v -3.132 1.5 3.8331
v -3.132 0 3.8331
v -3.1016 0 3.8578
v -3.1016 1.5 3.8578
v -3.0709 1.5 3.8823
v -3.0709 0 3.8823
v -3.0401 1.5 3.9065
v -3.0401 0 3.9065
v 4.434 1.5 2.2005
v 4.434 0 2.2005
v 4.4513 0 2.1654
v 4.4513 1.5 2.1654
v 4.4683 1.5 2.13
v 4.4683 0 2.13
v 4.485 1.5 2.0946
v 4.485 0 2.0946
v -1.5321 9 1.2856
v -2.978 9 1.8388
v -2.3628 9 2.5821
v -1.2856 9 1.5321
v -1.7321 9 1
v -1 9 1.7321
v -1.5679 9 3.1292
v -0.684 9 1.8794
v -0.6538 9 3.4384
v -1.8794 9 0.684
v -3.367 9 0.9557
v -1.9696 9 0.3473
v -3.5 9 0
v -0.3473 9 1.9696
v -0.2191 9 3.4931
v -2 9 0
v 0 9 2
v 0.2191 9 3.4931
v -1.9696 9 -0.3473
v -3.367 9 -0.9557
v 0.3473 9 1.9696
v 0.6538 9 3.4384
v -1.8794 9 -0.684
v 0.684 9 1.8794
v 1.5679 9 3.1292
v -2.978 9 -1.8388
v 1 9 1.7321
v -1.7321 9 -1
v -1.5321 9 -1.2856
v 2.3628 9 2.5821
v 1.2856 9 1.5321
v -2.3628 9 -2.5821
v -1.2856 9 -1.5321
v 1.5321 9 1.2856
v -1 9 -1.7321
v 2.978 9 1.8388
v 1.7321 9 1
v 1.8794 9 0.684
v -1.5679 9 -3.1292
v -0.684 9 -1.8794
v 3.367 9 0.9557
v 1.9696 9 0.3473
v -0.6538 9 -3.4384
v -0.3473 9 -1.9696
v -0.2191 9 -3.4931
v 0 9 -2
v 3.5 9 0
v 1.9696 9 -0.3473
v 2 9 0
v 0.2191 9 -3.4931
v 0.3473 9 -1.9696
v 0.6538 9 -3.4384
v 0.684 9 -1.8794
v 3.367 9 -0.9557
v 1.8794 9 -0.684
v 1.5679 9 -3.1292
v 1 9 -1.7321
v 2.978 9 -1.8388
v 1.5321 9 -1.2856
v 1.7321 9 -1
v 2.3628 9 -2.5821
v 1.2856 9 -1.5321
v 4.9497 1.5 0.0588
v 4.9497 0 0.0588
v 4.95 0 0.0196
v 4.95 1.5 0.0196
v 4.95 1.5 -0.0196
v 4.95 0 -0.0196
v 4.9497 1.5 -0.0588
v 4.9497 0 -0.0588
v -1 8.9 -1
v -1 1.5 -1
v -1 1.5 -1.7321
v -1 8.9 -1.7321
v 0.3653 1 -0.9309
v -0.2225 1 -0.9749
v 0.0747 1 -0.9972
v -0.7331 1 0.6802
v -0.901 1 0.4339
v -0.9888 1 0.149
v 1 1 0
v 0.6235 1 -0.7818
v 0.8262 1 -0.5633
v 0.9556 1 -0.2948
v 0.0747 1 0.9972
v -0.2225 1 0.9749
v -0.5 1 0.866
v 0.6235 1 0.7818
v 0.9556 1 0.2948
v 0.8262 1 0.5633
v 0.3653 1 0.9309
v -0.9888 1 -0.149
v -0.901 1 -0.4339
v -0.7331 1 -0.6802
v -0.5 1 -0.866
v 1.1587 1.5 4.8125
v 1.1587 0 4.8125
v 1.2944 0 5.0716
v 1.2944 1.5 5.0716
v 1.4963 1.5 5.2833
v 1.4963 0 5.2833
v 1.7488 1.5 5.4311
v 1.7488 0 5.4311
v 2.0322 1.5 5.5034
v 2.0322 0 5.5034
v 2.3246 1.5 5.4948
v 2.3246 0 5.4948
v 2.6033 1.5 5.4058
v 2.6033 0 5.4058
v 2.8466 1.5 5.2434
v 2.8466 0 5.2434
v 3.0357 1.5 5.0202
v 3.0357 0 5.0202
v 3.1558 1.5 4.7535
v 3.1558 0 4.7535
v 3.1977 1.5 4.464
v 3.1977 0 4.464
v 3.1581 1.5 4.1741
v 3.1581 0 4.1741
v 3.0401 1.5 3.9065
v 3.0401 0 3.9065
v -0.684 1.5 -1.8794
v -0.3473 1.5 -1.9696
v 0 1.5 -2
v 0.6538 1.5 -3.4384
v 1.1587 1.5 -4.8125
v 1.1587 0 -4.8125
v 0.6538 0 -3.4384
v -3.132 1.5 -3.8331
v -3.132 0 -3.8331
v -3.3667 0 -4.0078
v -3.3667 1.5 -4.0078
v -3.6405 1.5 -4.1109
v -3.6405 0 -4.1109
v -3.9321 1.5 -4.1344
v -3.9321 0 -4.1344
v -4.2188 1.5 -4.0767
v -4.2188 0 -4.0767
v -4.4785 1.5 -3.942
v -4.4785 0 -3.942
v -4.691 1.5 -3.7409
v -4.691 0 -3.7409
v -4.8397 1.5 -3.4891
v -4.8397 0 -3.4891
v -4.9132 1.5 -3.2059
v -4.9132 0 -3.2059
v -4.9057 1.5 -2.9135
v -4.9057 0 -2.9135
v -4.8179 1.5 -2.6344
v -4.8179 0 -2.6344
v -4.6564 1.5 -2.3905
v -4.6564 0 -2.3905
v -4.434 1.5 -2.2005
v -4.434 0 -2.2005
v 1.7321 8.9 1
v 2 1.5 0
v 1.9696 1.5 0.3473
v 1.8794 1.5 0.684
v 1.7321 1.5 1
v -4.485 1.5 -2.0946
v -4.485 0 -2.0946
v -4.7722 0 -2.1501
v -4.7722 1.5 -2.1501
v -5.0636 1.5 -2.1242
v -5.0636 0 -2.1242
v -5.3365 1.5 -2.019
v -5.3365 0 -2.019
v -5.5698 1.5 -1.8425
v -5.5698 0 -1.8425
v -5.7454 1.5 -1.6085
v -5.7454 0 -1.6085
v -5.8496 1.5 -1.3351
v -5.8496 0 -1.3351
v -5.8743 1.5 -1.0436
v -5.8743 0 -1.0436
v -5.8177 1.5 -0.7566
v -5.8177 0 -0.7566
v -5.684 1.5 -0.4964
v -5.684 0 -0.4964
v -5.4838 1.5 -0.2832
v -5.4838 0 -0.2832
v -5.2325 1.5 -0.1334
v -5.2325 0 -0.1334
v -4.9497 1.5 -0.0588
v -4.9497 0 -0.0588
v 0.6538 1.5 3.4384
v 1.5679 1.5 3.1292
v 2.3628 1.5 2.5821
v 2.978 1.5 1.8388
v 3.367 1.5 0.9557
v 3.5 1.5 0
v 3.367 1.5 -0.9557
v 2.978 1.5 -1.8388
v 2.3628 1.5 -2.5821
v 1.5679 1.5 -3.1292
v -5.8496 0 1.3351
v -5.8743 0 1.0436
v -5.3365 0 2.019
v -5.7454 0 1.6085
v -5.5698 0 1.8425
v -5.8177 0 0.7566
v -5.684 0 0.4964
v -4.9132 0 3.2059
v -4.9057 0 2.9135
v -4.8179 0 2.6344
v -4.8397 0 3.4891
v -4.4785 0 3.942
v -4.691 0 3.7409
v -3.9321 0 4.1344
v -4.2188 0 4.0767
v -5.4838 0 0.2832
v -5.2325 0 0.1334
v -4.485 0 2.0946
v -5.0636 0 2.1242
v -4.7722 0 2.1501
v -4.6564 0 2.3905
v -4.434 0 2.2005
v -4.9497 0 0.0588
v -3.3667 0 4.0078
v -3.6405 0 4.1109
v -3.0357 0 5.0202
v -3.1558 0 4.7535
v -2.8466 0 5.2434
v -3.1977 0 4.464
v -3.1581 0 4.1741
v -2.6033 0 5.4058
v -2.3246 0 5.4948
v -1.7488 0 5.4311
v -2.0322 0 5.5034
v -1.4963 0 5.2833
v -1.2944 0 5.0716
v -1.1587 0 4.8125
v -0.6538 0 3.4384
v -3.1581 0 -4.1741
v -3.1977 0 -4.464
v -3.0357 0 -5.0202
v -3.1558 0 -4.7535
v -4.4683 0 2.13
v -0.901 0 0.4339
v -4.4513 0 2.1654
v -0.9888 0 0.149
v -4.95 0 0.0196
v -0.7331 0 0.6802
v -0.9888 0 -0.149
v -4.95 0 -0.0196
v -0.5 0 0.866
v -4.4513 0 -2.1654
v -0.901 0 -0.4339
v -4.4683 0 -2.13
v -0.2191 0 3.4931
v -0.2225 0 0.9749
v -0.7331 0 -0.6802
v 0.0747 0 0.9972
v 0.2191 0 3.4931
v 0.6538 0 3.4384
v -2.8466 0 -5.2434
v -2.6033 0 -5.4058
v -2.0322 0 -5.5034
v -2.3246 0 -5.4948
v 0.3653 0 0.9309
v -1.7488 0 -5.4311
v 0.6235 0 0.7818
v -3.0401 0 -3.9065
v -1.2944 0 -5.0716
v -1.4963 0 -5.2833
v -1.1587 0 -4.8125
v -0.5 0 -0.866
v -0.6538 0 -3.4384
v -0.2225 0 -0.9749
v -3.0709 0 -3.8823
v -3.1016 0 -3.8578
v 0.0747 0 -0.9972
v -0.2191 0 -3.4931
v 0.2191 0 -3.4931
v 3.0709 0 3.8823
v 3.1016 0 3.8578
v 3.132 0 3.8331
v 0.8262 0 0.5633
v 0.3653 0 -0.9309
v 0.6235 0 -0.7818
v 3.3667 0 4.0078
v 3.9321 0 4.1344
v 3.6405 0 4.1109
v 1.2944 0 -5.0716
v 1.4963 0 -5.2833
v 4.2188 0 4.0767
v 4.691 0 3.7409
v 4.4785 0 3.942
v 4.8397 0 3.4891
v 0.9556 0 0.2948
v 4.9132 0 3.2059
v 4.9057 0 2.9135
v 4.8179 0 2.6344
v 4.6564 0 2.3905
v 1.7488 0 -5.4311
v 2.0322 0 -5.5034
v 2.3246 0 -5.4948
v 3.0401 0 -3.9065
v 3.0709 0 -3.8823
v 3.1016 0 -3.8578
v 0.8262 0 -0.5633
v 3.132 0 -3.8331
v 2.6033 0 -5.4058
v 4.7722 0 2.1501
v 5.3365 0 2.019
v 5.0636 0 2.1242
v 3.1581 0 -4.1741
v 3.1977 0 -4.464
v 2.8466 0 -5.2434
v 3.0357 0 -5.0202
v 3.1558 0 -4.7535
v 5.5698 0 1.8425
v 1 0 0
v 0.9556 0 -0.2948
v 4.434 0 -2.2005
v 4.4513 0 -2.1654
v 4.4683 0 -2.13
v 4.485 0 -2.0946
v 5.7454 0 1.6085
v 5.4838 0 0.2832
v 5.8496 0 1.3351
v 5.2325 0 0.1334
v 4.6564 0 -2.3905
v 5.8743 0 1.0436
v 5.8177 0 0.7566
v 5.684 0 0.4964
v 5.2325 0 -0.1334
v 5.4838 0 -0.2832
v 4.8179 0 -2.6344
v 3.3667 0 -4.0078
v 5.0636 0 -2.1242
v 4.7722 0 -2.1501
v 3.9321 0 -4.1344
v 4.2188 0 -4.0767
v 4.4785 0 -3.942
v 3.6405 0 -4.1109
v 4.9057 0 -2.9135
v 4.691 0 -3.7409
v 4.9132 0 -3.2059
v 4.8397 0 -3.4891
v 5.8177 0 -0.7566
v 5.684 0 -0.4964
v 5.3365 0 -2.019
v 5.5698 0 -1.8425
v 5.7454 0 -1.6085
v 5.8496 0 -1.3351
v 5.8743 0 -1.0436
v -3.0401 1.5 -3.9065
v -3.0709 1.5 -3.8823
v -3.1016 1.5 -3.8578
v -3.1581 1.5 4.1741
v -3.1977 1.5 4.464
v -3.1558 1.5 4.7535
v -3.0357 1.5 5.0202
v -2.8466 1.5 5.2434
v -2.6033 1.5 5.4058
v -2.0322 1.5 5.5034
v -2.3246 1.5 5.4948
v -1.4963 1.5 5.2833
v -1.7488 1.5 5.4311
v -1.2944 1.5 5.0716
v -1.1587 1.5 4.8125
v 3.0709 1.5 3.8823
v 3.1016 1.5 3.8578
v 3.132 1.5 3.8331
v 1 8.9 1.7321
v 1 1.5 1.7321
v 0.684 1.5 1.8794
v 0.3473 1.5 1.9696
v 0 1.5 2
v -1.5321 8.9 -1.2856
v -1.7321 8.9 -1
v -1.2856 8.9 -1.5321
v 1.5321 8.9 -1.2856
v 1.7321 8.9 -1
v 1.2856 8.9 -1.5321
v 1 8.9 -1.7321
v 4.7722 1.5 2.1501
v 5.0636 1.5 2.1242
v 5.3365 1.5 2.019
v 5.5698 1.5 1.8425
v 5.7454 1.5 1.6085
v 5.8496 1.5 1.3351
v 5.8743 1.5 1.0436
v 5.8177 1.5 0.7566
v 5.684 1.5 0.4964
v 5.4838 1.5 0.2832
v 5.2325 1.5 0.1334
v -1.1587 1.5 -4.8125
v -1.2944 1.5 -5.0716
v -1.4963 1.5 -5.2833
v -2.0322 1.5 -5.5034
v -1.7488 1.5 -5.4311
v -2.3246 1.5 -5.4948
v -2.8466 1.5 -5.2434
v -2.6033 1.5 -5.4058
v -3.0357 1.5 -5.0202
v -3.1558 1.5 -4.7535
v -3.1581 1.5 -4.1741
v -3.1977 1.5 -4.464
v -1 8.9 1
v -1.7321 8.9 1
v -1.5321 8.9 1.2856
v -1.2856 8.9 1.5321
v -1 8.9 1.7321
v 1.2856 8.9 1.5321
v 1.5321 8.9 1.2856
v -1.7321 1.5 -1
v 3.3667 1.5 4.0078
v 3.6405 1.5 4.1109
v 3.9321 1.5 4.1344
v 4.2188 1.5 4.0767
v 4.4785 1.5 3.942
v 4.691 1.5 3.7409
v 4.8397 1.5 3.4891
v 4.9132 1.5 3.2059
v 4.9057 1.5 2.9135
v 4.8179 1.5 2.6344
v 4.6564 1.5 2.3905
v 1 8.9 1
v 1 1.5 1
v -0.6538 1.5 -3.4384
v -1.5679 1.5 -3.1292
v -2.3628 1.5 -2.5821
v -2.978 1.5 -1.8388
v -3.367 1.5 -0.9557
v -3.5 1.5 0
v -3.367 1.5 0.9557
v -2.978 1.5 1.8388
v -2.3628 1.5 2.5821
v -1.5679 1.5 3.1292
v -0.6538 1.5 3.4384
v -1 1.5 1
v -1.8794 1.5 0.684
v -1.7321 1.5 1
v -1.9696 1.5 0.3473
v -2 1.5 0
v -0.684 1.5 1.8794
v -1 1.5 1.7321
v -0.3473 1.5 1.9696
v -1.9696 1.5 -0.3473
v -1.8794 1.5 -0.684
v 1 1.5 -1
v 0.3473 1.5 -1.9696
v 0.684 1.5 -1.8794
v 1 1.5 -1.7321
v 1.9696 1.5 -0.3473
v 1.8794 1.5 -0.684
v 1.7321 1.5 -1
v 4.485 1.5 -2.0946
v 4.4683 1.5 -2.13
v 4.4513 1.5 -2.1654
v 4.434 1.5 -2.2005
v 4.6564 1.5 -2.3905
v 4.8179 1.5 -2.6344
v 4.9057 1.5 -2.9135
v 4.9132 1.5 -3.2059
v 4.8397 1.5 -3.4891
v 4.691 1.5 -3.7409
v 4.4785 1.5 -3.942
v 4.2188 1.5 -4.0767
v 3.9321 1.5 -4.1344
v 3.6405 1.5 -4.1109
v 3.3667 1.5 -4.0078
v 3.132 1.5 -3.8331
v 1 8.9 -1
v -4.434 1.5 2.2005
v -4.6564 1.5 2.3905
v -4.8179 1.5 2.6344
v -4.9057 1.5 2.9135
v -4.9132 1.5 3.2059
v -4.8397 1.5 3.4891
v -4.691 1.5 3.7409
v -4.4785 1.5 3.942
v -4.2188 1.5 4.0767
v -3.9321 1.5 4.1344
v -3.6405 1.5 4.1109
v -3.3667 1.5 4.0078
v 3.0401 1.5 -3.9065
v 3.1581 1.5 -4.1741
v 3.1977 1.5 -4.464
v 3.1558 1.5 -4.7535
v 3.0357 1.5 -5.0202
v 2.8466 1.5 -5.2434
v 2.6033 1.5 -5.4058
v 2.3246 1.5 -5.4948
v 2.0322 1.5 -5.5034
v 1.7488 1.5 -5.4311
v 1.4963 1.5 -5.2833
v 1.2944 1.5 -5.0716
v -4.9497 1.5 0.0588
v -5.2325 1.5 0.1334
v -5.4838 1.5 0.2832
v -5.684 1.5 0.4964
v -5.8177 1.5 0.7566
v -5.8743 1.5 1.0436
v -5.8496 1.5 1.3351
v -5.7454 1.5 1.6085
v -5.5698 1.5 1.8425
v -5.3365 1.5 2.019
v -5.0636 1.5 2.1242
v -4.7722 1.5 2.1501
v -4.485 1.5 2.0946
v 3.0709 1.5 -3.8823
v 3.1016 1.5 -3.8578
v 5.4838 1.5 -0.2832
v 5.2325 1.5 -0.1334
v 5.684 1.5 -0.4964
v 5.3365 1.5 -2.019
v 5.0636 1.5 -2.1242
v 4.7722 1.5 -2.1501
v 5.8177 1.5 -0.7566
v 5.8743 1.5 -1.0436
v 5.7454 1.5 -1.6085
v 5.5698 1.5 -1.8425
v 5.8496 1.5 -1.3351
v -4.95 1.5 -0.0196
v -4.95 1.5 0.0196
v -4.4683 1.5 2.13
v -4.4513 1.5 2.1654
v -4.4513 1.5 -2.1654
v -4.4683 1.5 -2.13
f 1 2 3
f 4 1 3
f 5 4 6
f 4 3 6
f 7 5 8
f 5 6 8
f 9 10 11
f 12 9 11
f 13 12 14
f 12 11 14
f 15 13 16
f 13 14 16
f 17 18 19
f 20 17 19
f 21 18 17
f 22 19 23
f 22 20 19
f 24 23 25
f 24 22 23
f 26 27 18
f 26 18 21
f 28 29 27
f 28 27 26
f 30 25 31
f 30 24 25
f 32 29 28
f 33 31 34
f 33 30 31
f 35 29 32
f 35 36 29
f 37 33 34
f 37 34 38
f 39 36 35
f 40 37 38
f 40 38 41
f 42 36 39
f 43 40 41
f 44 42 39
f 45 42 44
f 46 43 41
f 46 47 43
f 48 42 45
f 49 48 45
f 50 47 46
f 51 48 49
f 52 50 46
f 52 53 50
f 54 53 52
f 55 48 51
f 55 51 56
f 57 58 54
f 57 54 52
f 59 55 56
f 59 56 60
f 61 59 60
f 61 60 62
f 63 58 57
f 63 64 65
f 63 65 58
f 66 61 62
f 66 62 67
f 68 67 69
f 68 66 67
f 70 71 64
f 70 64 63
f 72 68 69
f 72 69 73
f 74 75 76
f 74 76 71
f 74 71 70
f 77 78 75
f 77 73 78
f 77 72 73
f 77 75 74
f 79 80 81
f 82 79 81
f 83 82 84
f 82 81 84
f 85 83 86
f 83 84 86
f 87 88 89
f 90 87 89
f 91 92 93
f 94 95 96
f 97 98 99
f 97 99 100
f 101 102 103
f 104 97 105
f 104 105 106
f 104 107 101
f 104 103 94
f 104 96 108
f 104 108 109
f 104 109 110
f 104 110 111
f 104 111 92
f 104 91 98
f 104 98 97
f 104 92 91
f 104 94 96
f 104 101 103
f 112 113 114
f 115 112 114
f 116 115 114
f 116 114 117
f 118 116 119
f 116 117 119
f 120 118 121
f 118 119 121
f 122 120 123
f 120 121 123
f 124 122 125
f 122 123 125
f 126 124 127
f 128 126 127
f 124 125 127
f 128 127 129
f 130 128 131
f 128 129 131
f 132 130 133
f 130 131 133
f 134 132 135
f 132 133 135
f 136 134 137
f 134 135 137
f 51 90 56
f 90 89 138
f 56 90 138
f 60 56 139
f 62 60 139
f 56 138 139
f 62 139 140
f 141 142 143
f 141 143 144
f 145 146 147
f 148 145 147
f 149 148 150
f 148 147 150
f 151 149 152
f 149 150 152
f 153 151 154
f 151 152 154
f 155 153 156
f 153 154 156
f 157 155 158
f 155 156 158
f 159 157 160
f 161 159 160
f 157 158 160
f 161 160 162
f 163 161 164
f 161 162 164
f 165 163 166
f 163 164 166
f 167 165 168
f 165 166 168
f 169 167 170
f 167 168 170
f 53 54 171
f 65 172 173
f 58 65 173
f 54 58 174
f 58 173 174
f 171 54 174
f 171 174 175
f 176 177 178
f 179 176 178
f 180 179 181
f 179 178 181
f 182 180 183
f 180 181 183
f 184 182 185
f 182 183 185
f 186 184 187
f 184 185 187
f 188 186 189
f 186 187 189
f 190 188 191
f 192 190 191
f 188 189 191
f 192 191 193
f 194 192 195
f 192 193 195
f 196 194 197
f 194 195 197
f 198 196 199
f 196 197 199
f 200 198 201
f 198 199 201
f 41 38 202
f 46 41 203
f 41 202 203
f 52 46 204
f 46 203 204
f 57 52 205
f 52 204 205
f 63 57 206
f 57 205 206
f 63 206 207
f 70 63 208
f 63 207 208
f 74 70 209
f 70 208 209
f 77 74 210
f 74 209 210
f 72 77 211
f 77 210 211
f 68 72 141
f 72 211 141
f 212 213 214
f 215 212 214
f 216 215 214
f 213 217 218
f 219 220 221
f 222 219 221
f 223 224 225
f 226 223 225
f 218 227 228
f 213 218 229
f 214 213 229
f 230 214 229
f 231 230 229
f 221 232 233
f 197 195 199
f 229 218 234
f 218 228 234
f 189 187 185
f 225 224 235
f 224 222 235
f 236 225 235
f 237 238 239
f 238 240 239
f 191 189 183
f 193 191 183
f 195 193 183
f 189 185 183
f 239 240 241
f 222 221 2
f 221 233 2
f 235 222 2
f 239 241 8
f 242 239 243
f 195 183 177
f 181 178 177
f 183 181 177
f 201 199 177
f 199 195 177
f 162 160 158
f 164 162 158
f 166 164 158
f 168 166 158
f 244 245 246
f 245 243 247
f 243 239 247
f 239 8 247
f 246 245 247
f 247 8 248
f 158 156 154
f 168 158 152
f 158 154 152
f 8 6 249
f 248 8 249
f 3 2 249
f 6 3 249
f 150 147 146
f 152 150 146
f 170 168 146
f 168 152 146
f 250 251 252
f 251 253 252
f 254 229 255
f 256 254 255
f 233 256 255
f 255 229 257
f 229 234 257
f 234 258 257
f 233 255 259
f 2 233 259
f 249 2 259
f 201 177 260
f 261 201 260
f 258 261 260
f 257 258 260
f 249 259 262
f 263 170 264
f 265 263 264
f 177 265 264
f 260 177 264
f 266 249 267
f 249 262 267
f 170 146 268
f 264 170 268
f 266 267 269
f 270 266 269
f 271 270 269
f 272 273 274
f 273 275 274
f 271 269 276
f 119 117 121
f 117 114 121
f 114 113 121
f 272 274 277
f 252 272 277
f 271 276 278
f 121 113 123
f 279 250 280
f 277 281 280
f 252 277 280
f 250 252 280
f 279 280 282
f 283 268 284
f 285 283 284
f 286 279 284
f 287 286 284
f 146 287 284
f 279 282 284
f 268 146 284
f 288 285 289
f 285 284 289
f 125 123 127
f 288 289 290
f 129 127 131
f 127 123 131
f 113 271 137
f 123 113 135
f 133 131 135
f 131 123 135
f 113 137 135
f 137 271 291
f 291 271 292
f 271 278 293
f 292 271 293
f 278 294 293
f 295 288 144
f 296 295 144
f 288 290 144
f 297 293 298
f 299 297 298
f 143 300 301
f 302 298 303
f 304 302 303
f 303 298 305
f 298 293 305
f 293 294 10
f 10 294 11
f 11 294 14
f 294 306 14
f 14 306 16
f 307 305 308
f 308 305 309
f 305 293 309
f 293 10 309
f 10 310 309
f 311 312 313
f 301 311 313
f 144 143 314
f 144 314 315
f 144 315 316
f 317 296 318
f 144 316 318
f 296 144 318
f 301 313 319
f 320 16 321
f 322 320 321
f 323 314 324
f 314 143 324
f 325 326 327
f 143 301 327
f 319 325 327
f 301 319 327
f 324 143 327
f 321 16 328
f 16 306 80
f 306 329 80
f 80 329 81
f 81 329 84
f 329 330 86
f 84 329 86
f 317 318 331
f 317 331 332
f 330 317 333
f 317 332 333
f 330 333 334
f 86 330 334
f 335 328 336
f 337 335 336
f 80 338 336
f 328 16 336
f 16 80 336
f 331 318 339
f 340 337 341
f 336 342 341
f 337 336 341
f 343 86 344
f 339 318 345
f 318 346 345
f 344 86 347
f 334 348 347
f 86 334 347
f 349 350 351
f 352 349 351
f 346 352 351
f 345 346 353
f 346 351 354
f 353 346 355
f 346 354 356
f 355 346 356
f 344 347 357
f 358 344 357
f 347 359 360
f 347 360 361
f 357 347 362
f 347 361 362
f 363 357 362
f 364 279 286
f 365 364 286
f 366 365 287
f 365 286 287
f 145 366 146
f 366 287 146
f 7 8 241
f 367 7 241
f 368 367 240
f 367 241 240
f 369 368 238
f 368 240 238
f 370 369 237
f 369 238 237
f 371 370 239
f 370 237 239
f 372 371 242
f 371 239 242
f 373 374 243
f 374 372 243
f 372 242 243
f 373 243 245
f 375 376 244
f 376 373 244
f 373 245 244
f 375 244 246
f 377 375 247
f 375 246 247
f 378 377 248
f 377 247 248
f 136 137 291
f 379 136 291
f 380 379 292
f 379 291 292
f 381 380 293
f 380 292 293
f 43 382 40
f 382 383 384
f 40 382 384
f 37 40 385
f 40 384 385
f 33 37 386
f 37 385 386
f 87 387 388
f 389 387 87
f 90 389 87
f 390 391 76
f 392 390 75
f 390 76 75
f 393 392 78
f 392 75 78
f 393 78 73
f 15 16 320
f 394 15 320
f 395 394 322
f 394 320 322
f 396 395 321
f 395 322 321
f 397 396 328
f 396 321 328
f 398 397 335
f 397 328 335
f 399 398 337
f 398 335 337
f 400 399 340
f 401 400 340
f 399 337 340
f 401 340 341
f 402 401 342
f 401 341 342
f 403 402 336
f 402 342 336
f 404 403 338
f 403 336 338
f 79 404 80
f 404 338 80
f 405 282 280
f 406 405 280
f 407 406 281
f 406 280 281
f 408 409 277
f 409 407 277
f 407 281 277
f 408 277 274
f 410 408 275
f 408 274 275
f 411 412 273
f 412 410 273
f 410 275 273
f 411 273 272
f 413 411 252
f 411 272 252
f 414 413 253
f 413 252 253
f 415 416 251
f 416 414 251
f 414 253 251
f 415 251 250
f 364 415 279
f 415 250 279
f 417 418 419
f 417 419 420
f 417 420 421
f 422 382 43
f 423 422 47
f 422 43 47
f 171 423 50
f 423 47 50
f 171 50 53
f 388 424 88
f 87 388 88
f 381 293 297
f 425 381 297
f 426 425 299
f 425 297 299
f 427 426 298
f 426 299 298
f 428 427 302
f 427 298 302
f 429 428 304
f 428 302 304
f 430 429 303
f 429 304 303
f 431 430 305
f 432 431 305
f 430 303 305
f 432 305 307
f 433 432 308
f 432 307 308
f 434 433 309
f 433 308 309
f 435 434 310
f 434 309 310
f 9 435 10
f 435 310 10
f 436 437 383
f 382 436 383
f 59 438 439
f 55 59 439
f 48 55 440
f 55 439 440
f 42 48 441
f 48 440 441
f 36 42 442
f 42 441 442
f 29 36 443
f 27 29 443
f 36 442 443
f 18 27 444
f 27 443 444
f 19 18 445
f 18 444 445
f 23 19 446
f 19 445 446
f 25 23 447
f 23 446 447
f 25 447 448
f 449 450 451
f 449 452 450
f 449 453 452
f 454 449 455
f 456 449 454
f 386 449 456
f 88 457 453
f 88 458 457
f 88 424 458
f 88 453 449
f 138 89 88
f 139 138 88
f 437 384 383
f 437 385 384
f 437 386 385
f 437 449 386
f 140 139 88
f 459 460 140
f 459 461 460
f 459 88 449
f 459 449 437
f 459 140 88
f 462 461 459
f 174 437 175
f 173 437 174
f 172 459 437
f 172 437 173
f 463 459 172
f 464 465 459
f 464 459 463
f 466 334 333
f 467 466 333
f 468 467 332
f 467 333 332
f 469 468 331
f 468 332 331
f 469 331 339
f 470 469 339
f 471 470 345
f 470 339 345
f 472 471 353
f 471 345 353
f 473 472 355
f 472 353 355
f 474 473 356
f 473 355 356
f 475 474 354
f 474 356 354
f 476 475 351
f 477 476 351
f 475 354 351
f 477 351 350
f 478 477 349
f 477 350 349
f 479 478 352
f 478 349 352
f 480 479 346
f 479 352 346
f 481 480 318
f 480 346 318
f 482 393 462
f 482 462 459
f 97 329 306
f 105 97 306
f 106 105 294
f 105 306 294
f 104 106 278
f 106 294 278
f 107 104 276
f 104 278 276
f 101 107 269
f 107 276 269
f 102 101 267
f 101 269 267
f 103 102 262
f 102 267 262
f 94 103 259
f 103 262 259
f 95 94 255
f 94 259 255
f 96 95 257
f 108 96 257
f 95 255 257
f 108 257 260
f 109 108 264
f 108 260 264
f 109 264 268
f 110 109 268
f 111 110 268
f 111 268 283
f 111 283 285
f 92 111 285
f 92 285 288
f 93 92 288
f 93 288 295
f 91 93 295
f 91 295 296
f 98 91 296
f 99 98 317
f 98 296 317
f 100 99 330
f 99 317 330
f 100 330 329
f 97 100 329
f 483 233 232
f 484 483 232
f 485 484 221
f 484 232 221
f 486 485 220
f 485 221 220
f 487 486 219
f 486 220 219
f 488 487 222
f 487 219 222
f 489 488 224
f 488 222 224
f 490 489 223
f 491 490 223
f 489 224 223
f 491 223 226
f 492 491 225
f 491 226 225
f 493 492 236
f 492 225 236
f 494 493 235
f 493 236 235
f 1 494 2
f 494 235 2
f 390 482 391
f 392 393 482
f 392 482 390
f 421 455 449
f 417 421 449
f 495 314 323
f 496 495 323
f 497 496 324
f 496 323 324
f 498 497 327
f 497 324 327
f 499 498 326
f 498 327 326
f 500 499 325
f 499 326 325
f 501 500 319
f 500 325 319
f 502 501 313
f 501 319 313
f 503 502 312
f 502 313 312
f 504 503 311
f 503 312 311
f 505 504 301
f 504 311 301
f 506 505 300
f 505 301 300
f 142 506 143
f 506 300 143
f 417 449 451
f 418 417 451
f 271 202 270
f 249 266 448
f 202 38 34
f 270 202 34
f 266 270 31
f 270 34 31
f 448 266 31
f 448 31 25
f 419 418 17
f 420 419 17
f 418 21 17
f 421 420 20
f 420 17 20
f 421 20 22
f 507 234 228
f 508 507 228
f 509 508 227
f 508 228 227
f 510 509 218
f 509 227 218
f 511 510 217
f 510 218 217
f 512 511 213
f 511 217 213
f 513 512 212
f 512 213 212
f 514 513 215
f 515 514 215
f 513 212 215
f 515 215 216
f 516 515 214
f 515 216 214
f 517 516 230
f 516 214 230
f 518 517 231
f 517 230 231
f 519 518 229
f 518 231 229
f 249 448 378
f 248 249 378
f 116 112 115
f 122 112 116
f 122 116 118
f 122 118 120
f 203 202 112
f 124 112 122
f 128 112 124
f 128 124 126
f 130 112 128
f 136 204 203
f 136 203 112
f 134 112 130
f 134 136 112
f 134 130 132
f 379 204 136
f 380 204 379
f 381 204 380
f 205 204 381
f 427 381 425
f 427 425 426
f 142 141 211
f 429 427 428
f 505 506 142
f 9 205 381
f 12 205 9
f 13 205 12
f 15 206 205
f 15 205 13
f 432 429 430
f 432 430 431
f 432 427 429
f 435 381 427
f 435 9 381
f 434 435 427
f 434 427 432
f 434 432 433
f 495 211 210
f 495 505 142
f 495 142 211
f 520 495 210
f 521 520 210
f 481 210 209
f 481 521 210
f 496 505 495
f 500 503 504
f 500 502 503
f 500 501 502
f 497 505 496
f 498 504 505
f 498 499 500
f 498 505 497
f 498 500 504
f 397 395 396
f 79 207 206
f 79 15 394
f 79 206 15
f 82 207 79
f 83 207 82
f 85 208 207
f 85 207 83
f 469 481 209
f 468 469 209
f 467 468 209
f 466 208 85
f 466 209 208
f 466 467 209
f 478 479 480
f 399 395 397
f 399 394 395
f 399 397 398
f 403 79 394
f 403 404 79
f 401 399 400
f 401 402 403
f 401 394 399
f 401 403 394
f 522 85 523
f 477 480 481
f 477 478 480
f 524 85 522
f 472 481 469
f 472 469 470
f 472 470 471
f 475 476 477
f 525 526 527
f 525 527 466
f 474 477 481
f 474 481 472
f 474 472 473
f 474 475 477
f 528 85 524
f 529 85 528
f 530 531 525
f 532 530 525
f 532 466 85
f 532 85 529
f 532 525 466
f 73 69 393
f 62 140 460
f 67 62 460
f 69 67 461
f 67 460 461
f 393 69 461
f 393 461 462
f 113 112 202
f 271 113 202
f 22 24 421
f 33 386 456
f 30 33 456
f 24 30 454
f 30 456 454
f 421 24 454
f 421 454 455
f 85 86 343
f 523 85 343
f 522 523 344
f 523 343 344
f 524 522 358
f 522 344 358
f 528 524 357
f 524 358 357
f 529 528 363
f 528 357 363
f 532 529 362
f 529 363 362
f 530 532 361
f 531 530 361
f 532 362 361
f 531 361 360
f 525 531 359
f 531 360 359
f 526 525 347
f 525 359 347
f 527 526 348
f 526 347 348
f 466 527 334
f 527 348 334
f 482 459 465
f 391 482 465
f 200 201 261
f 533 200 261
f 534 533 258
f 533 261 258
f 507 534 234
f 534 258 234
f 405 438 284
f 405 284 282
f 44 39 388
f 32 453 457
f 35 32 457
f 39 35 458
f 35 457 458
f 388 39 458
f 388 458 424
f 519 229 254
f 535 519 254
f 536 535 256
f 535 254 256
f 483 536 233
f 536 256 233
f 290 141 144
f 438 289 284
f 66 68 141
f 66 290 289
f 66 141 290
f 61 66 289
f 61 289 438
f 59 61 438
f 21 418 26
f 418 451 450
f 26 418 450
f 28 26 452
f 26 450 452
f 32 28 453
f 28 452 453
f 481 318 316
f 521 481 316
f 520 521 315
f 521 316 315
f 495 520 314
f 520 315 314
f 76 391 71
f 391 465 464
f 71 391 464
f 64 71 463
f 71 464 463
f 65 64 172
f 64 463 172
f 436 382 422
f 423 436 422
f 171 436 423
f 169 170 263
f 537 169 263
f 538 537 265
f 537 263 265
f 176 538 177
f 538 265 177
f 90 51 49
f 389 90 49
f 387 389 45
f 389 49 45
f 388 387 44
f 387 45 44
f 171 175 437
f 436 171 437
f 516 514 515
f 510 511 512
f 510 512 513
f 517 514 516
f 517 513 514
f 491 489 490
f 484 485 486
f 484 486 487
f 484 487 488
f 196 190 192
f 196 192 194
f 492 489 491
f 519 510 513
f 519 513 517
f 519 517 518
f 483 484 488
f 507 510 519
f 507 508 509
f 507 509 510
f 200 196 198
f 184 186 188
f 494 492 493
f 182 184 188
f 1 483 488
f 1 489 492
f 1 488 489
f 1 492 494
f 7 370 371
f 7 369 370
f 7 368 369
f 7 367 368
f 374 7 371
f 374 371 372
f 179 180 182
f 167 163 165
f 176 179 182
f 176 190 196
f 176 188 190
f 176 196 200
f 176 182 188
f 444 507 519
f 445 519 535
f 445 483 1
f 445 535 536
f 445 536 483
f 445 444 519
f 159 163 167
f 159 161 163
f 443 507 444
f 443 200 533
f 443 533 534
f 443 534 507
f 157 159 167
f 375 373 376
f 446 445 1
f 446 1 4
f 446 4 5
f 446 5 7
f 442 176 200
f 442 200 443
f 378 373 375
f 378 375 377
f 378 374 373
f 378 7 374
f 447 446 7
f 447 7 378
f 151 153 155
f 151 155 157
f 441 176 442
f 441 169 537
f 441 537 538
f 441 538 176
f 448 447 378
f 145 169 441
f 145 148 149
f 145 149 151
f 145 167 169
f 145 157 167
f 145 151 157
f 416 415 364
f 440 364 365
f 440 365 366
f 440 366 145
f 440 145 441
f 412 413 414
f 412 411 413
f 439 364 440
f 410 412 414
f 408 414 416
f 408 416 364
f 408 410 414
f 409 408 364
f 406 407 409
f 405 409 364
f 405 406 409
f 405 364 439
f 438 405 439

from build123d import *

# Parameters (mm, degrees)
SKETCH1_R               = 1.05
SKETCH1_R_2             = 4.95
BOSS_EXTRUDE1_DEPTH     = 1.5
CIRPATTERN1_COUNT       = 14
SKETCH2_R               = 3.5
SKETCH2_R_2             = 2
SKETCH2_W               = 2
SKETCH2_H               = 4
SKETCH2_W_2             = 4
SKETCH2_H_2             = 2
BOSS_EXTRUDE2_DEPTH     = 7.5
SKETCH3_R               = 2
CUT_EXTRUDE1_DEPTH      = 0.1
SKETCH4_R               = 1
CUT_EXTRUDE2_DEPTH      = 1
CUT_EXTRUDE3_DEPTH      = 1
CUT_EXTRUDE3_DEPTH_BACK = 10


with BuildPart() as part:
    # Sketch1 → Boss-Extrude1 (new body)
    with BuildSketch(Plane(origin=(0, 0, 0), x_dir=(1, 0, 0), z_dir=(0, 1, 0))):
        with Locations((0, 4.95)):
            Circle(SKETCH1_R)
        Circle(SKETCH1_R_2)
    boss_extrude1 = extrude(amount=BOSS_EXTRUDE1_DEPTH)

    # CirPattern1: Boss-Extrude1 ×14 about axis
    cirpattern1_axis = Axis((0, 0, 0), (0, 1, 0))
    for i in range(1, CIRPATTERN1_COUNT):
        add(boss_extrude1.rotate(cirpattern1_axis, i * 360 / CIRPATTERN1_COUNT))

    # Sketch2 → Boss-Extrude2 (add)
    with BuildSketch(Plane(origin=(0, 1.5, 0), x_dir=(1, 0, 0), z_dir=(0, 1, 0))):
        Circle(SKETCH2_R)
        Circle(SKETCH2_R_2, mode=Mode.SUBTRACT)
        Rectangle(SKETCH2_W, SKETCH2_H, mode=Mode.SUBTRACT)
        Rectangle(SKETCH2_W_2, SKETCH2_H_2, mode=Mode.SUBTRACT)
        with BuildLine():
            ThreePointArc((-1, 1.732050808), (-0.517638086, 1.931851654), (9e-09, 2))
            Line((9e-09, 2), (-1, 2))
            Line((-1, 2), (-1, 1.732050808))
        make_face()
        with BuildLine():
            Line((1, 1.732050808), (1, 2))
            Line((1, 2), (9e-09, 2))
            ThreePointArc((9e-09, 2), (0.517638095, 1.931851651), (1, 1.732050808))
        make_face()
        with BuildLine():
            Line((2, 1), (1.732050808, 1))
            ThreePointArc((1.732050808, 1), (1.931851653, 0.51763809), (2, 0))
            Line((2, 0), (2, 1))
        make_face()
        with BuildLine():
            ThreePointArc((1.732050808, 1), (1.414213562, 1.414213562), (1, 1.732050808))
            Line((1, 1.732050808), (1, 1))
            Line((1, 1), (1.732050808, 1))
        make_face()
        with BuildLine():
            Line((-1, 1), (-1, 1.732050808))
            ThreePointArc((-1, 1.732050808), (-1.414213562, 1.414213562), (-1.732050808, 1))
            Line((-1.732050808, 1), (-1, 1))
        make_face()
        with BuildLine():
            ThreePointArc((-2, 0), (-1.931851653, 0.51763809), (-1.732050808, 1))
            Line((-1.732050808, 1), (-2, 1))
            Line((-2, 1), (-2, 0))
        make_face()
        with BuildLine():
            ThreePointArc((-1.732050808, -1), (-1.931851653, -0.51763809), (-2, 0))
            Line((-2, 0), (-2, -1))
            Line((-2, -1), (-1.732050808, -1))
        make_face()
        with BuildLine():
            Line((-1, -1.732050808), (-1, -1))
            Line((-1, -1), (-1.732050808, -1))
            ThreePointArc((-1.732050808, -1), (-1.414213562, -1.414213562), (-1, -1.732050808))
        make_face()
        with BuildLine():
            ThreePointArc((0, -2), (-0.51763809, -1.931851653), (-1, -1.732050808))
            Line((-1, -1.732050808), (-1, -2))
            Line((-1, -2), (0, -2))
        make_face()
        with BuildLine():
            Line((1, -2), (1, -1.732050808))
            ThreePointArc((1, -1.732050808), (0.51763809, -1.931851653), (0, -2))
            Line((0, -2), (1, -2))
        make_face()
        with BuildLine():
            Line((1.732050808, -1), (1, -1))
            Line((1, -1), (1, -1.732050808))
            ThreePointArc((1, -1.732050808), (1.414213562, -1.414213562), (1.732050808, -1))
        make_face()
        with BuildLine():
            Line((2, -1), (2, 0))
            ThreePointArc((2, 0), (1.931851653, -0.51763809), (1.732050808, -1))
            Line((1.732050808, -1), (2, -1))
        make_face()
    extrude(amount=BOSS_EXTRUDE2_DEPTH)

    # Sketch3 → Cut-Extrude1 (cut)
    with BuildSketch(Plane(origin=(0, 9, 0), x_dir=(1, 0, 0), z_dir=(0, 1, 0))):
        Circle(SKETCH3_R)
    extrude(amount=-CUT_EXTRUDE1_DEPTH, mode=Mode.SUBTRACT)

    # Sketch4 → Cut-Extrude2 (cut)
    with BuildSketch(Plane.XZ):
        Circle(SKETCH4_R)
    extrude(amount=-CUT_EXTRUDE2_DEPTH, mode=Mode.SUBTRACT)

    # Sketch5 → Cut-Extrude3 (cut, two sides)
    with BuildSketch(Plane(origin=(0, 9, 0), x_dir=(1, 0, 0), z_dir=(0, 1, 0))) as cut_extrude3_sk:
        with BuildLine():
            Line((-1.594989552, 6), (1.594989552, 6))
            Line((1.594989552, 6), (0.653815854, 3.43838986))
            ThreePointArc((0.653815854, 3.43838986), (0, 3.5), (-0.653815854, 3.43838986))
            Line((-0.653815854, 3.43838986), (-1.594989552, 6))
        make_face()
        with BuildLine():
            Line((1.594989552, -6), (0.653815854, -3.43838986))
            ThreePointArc((0.653815854, -3.43838986), (0, -3.5), (-0.653815854, -3.43838986))
            Line((-0.653815854, -3.43838986), (-1.594989552, -6))
            Line((-1.594989552, -6), (1.594989552, -6))
        make_face()
    extrude(amount=CUT_EXTRUDE3_DEPTH, mode=Mode.SUBTRACT)
    extrude(cut_extrude3_sk.sketch, amount=-CUT_EXTRUDE3_DEPTH_BACK, mode=Mode.SUBTRACT)


solid = part.part
